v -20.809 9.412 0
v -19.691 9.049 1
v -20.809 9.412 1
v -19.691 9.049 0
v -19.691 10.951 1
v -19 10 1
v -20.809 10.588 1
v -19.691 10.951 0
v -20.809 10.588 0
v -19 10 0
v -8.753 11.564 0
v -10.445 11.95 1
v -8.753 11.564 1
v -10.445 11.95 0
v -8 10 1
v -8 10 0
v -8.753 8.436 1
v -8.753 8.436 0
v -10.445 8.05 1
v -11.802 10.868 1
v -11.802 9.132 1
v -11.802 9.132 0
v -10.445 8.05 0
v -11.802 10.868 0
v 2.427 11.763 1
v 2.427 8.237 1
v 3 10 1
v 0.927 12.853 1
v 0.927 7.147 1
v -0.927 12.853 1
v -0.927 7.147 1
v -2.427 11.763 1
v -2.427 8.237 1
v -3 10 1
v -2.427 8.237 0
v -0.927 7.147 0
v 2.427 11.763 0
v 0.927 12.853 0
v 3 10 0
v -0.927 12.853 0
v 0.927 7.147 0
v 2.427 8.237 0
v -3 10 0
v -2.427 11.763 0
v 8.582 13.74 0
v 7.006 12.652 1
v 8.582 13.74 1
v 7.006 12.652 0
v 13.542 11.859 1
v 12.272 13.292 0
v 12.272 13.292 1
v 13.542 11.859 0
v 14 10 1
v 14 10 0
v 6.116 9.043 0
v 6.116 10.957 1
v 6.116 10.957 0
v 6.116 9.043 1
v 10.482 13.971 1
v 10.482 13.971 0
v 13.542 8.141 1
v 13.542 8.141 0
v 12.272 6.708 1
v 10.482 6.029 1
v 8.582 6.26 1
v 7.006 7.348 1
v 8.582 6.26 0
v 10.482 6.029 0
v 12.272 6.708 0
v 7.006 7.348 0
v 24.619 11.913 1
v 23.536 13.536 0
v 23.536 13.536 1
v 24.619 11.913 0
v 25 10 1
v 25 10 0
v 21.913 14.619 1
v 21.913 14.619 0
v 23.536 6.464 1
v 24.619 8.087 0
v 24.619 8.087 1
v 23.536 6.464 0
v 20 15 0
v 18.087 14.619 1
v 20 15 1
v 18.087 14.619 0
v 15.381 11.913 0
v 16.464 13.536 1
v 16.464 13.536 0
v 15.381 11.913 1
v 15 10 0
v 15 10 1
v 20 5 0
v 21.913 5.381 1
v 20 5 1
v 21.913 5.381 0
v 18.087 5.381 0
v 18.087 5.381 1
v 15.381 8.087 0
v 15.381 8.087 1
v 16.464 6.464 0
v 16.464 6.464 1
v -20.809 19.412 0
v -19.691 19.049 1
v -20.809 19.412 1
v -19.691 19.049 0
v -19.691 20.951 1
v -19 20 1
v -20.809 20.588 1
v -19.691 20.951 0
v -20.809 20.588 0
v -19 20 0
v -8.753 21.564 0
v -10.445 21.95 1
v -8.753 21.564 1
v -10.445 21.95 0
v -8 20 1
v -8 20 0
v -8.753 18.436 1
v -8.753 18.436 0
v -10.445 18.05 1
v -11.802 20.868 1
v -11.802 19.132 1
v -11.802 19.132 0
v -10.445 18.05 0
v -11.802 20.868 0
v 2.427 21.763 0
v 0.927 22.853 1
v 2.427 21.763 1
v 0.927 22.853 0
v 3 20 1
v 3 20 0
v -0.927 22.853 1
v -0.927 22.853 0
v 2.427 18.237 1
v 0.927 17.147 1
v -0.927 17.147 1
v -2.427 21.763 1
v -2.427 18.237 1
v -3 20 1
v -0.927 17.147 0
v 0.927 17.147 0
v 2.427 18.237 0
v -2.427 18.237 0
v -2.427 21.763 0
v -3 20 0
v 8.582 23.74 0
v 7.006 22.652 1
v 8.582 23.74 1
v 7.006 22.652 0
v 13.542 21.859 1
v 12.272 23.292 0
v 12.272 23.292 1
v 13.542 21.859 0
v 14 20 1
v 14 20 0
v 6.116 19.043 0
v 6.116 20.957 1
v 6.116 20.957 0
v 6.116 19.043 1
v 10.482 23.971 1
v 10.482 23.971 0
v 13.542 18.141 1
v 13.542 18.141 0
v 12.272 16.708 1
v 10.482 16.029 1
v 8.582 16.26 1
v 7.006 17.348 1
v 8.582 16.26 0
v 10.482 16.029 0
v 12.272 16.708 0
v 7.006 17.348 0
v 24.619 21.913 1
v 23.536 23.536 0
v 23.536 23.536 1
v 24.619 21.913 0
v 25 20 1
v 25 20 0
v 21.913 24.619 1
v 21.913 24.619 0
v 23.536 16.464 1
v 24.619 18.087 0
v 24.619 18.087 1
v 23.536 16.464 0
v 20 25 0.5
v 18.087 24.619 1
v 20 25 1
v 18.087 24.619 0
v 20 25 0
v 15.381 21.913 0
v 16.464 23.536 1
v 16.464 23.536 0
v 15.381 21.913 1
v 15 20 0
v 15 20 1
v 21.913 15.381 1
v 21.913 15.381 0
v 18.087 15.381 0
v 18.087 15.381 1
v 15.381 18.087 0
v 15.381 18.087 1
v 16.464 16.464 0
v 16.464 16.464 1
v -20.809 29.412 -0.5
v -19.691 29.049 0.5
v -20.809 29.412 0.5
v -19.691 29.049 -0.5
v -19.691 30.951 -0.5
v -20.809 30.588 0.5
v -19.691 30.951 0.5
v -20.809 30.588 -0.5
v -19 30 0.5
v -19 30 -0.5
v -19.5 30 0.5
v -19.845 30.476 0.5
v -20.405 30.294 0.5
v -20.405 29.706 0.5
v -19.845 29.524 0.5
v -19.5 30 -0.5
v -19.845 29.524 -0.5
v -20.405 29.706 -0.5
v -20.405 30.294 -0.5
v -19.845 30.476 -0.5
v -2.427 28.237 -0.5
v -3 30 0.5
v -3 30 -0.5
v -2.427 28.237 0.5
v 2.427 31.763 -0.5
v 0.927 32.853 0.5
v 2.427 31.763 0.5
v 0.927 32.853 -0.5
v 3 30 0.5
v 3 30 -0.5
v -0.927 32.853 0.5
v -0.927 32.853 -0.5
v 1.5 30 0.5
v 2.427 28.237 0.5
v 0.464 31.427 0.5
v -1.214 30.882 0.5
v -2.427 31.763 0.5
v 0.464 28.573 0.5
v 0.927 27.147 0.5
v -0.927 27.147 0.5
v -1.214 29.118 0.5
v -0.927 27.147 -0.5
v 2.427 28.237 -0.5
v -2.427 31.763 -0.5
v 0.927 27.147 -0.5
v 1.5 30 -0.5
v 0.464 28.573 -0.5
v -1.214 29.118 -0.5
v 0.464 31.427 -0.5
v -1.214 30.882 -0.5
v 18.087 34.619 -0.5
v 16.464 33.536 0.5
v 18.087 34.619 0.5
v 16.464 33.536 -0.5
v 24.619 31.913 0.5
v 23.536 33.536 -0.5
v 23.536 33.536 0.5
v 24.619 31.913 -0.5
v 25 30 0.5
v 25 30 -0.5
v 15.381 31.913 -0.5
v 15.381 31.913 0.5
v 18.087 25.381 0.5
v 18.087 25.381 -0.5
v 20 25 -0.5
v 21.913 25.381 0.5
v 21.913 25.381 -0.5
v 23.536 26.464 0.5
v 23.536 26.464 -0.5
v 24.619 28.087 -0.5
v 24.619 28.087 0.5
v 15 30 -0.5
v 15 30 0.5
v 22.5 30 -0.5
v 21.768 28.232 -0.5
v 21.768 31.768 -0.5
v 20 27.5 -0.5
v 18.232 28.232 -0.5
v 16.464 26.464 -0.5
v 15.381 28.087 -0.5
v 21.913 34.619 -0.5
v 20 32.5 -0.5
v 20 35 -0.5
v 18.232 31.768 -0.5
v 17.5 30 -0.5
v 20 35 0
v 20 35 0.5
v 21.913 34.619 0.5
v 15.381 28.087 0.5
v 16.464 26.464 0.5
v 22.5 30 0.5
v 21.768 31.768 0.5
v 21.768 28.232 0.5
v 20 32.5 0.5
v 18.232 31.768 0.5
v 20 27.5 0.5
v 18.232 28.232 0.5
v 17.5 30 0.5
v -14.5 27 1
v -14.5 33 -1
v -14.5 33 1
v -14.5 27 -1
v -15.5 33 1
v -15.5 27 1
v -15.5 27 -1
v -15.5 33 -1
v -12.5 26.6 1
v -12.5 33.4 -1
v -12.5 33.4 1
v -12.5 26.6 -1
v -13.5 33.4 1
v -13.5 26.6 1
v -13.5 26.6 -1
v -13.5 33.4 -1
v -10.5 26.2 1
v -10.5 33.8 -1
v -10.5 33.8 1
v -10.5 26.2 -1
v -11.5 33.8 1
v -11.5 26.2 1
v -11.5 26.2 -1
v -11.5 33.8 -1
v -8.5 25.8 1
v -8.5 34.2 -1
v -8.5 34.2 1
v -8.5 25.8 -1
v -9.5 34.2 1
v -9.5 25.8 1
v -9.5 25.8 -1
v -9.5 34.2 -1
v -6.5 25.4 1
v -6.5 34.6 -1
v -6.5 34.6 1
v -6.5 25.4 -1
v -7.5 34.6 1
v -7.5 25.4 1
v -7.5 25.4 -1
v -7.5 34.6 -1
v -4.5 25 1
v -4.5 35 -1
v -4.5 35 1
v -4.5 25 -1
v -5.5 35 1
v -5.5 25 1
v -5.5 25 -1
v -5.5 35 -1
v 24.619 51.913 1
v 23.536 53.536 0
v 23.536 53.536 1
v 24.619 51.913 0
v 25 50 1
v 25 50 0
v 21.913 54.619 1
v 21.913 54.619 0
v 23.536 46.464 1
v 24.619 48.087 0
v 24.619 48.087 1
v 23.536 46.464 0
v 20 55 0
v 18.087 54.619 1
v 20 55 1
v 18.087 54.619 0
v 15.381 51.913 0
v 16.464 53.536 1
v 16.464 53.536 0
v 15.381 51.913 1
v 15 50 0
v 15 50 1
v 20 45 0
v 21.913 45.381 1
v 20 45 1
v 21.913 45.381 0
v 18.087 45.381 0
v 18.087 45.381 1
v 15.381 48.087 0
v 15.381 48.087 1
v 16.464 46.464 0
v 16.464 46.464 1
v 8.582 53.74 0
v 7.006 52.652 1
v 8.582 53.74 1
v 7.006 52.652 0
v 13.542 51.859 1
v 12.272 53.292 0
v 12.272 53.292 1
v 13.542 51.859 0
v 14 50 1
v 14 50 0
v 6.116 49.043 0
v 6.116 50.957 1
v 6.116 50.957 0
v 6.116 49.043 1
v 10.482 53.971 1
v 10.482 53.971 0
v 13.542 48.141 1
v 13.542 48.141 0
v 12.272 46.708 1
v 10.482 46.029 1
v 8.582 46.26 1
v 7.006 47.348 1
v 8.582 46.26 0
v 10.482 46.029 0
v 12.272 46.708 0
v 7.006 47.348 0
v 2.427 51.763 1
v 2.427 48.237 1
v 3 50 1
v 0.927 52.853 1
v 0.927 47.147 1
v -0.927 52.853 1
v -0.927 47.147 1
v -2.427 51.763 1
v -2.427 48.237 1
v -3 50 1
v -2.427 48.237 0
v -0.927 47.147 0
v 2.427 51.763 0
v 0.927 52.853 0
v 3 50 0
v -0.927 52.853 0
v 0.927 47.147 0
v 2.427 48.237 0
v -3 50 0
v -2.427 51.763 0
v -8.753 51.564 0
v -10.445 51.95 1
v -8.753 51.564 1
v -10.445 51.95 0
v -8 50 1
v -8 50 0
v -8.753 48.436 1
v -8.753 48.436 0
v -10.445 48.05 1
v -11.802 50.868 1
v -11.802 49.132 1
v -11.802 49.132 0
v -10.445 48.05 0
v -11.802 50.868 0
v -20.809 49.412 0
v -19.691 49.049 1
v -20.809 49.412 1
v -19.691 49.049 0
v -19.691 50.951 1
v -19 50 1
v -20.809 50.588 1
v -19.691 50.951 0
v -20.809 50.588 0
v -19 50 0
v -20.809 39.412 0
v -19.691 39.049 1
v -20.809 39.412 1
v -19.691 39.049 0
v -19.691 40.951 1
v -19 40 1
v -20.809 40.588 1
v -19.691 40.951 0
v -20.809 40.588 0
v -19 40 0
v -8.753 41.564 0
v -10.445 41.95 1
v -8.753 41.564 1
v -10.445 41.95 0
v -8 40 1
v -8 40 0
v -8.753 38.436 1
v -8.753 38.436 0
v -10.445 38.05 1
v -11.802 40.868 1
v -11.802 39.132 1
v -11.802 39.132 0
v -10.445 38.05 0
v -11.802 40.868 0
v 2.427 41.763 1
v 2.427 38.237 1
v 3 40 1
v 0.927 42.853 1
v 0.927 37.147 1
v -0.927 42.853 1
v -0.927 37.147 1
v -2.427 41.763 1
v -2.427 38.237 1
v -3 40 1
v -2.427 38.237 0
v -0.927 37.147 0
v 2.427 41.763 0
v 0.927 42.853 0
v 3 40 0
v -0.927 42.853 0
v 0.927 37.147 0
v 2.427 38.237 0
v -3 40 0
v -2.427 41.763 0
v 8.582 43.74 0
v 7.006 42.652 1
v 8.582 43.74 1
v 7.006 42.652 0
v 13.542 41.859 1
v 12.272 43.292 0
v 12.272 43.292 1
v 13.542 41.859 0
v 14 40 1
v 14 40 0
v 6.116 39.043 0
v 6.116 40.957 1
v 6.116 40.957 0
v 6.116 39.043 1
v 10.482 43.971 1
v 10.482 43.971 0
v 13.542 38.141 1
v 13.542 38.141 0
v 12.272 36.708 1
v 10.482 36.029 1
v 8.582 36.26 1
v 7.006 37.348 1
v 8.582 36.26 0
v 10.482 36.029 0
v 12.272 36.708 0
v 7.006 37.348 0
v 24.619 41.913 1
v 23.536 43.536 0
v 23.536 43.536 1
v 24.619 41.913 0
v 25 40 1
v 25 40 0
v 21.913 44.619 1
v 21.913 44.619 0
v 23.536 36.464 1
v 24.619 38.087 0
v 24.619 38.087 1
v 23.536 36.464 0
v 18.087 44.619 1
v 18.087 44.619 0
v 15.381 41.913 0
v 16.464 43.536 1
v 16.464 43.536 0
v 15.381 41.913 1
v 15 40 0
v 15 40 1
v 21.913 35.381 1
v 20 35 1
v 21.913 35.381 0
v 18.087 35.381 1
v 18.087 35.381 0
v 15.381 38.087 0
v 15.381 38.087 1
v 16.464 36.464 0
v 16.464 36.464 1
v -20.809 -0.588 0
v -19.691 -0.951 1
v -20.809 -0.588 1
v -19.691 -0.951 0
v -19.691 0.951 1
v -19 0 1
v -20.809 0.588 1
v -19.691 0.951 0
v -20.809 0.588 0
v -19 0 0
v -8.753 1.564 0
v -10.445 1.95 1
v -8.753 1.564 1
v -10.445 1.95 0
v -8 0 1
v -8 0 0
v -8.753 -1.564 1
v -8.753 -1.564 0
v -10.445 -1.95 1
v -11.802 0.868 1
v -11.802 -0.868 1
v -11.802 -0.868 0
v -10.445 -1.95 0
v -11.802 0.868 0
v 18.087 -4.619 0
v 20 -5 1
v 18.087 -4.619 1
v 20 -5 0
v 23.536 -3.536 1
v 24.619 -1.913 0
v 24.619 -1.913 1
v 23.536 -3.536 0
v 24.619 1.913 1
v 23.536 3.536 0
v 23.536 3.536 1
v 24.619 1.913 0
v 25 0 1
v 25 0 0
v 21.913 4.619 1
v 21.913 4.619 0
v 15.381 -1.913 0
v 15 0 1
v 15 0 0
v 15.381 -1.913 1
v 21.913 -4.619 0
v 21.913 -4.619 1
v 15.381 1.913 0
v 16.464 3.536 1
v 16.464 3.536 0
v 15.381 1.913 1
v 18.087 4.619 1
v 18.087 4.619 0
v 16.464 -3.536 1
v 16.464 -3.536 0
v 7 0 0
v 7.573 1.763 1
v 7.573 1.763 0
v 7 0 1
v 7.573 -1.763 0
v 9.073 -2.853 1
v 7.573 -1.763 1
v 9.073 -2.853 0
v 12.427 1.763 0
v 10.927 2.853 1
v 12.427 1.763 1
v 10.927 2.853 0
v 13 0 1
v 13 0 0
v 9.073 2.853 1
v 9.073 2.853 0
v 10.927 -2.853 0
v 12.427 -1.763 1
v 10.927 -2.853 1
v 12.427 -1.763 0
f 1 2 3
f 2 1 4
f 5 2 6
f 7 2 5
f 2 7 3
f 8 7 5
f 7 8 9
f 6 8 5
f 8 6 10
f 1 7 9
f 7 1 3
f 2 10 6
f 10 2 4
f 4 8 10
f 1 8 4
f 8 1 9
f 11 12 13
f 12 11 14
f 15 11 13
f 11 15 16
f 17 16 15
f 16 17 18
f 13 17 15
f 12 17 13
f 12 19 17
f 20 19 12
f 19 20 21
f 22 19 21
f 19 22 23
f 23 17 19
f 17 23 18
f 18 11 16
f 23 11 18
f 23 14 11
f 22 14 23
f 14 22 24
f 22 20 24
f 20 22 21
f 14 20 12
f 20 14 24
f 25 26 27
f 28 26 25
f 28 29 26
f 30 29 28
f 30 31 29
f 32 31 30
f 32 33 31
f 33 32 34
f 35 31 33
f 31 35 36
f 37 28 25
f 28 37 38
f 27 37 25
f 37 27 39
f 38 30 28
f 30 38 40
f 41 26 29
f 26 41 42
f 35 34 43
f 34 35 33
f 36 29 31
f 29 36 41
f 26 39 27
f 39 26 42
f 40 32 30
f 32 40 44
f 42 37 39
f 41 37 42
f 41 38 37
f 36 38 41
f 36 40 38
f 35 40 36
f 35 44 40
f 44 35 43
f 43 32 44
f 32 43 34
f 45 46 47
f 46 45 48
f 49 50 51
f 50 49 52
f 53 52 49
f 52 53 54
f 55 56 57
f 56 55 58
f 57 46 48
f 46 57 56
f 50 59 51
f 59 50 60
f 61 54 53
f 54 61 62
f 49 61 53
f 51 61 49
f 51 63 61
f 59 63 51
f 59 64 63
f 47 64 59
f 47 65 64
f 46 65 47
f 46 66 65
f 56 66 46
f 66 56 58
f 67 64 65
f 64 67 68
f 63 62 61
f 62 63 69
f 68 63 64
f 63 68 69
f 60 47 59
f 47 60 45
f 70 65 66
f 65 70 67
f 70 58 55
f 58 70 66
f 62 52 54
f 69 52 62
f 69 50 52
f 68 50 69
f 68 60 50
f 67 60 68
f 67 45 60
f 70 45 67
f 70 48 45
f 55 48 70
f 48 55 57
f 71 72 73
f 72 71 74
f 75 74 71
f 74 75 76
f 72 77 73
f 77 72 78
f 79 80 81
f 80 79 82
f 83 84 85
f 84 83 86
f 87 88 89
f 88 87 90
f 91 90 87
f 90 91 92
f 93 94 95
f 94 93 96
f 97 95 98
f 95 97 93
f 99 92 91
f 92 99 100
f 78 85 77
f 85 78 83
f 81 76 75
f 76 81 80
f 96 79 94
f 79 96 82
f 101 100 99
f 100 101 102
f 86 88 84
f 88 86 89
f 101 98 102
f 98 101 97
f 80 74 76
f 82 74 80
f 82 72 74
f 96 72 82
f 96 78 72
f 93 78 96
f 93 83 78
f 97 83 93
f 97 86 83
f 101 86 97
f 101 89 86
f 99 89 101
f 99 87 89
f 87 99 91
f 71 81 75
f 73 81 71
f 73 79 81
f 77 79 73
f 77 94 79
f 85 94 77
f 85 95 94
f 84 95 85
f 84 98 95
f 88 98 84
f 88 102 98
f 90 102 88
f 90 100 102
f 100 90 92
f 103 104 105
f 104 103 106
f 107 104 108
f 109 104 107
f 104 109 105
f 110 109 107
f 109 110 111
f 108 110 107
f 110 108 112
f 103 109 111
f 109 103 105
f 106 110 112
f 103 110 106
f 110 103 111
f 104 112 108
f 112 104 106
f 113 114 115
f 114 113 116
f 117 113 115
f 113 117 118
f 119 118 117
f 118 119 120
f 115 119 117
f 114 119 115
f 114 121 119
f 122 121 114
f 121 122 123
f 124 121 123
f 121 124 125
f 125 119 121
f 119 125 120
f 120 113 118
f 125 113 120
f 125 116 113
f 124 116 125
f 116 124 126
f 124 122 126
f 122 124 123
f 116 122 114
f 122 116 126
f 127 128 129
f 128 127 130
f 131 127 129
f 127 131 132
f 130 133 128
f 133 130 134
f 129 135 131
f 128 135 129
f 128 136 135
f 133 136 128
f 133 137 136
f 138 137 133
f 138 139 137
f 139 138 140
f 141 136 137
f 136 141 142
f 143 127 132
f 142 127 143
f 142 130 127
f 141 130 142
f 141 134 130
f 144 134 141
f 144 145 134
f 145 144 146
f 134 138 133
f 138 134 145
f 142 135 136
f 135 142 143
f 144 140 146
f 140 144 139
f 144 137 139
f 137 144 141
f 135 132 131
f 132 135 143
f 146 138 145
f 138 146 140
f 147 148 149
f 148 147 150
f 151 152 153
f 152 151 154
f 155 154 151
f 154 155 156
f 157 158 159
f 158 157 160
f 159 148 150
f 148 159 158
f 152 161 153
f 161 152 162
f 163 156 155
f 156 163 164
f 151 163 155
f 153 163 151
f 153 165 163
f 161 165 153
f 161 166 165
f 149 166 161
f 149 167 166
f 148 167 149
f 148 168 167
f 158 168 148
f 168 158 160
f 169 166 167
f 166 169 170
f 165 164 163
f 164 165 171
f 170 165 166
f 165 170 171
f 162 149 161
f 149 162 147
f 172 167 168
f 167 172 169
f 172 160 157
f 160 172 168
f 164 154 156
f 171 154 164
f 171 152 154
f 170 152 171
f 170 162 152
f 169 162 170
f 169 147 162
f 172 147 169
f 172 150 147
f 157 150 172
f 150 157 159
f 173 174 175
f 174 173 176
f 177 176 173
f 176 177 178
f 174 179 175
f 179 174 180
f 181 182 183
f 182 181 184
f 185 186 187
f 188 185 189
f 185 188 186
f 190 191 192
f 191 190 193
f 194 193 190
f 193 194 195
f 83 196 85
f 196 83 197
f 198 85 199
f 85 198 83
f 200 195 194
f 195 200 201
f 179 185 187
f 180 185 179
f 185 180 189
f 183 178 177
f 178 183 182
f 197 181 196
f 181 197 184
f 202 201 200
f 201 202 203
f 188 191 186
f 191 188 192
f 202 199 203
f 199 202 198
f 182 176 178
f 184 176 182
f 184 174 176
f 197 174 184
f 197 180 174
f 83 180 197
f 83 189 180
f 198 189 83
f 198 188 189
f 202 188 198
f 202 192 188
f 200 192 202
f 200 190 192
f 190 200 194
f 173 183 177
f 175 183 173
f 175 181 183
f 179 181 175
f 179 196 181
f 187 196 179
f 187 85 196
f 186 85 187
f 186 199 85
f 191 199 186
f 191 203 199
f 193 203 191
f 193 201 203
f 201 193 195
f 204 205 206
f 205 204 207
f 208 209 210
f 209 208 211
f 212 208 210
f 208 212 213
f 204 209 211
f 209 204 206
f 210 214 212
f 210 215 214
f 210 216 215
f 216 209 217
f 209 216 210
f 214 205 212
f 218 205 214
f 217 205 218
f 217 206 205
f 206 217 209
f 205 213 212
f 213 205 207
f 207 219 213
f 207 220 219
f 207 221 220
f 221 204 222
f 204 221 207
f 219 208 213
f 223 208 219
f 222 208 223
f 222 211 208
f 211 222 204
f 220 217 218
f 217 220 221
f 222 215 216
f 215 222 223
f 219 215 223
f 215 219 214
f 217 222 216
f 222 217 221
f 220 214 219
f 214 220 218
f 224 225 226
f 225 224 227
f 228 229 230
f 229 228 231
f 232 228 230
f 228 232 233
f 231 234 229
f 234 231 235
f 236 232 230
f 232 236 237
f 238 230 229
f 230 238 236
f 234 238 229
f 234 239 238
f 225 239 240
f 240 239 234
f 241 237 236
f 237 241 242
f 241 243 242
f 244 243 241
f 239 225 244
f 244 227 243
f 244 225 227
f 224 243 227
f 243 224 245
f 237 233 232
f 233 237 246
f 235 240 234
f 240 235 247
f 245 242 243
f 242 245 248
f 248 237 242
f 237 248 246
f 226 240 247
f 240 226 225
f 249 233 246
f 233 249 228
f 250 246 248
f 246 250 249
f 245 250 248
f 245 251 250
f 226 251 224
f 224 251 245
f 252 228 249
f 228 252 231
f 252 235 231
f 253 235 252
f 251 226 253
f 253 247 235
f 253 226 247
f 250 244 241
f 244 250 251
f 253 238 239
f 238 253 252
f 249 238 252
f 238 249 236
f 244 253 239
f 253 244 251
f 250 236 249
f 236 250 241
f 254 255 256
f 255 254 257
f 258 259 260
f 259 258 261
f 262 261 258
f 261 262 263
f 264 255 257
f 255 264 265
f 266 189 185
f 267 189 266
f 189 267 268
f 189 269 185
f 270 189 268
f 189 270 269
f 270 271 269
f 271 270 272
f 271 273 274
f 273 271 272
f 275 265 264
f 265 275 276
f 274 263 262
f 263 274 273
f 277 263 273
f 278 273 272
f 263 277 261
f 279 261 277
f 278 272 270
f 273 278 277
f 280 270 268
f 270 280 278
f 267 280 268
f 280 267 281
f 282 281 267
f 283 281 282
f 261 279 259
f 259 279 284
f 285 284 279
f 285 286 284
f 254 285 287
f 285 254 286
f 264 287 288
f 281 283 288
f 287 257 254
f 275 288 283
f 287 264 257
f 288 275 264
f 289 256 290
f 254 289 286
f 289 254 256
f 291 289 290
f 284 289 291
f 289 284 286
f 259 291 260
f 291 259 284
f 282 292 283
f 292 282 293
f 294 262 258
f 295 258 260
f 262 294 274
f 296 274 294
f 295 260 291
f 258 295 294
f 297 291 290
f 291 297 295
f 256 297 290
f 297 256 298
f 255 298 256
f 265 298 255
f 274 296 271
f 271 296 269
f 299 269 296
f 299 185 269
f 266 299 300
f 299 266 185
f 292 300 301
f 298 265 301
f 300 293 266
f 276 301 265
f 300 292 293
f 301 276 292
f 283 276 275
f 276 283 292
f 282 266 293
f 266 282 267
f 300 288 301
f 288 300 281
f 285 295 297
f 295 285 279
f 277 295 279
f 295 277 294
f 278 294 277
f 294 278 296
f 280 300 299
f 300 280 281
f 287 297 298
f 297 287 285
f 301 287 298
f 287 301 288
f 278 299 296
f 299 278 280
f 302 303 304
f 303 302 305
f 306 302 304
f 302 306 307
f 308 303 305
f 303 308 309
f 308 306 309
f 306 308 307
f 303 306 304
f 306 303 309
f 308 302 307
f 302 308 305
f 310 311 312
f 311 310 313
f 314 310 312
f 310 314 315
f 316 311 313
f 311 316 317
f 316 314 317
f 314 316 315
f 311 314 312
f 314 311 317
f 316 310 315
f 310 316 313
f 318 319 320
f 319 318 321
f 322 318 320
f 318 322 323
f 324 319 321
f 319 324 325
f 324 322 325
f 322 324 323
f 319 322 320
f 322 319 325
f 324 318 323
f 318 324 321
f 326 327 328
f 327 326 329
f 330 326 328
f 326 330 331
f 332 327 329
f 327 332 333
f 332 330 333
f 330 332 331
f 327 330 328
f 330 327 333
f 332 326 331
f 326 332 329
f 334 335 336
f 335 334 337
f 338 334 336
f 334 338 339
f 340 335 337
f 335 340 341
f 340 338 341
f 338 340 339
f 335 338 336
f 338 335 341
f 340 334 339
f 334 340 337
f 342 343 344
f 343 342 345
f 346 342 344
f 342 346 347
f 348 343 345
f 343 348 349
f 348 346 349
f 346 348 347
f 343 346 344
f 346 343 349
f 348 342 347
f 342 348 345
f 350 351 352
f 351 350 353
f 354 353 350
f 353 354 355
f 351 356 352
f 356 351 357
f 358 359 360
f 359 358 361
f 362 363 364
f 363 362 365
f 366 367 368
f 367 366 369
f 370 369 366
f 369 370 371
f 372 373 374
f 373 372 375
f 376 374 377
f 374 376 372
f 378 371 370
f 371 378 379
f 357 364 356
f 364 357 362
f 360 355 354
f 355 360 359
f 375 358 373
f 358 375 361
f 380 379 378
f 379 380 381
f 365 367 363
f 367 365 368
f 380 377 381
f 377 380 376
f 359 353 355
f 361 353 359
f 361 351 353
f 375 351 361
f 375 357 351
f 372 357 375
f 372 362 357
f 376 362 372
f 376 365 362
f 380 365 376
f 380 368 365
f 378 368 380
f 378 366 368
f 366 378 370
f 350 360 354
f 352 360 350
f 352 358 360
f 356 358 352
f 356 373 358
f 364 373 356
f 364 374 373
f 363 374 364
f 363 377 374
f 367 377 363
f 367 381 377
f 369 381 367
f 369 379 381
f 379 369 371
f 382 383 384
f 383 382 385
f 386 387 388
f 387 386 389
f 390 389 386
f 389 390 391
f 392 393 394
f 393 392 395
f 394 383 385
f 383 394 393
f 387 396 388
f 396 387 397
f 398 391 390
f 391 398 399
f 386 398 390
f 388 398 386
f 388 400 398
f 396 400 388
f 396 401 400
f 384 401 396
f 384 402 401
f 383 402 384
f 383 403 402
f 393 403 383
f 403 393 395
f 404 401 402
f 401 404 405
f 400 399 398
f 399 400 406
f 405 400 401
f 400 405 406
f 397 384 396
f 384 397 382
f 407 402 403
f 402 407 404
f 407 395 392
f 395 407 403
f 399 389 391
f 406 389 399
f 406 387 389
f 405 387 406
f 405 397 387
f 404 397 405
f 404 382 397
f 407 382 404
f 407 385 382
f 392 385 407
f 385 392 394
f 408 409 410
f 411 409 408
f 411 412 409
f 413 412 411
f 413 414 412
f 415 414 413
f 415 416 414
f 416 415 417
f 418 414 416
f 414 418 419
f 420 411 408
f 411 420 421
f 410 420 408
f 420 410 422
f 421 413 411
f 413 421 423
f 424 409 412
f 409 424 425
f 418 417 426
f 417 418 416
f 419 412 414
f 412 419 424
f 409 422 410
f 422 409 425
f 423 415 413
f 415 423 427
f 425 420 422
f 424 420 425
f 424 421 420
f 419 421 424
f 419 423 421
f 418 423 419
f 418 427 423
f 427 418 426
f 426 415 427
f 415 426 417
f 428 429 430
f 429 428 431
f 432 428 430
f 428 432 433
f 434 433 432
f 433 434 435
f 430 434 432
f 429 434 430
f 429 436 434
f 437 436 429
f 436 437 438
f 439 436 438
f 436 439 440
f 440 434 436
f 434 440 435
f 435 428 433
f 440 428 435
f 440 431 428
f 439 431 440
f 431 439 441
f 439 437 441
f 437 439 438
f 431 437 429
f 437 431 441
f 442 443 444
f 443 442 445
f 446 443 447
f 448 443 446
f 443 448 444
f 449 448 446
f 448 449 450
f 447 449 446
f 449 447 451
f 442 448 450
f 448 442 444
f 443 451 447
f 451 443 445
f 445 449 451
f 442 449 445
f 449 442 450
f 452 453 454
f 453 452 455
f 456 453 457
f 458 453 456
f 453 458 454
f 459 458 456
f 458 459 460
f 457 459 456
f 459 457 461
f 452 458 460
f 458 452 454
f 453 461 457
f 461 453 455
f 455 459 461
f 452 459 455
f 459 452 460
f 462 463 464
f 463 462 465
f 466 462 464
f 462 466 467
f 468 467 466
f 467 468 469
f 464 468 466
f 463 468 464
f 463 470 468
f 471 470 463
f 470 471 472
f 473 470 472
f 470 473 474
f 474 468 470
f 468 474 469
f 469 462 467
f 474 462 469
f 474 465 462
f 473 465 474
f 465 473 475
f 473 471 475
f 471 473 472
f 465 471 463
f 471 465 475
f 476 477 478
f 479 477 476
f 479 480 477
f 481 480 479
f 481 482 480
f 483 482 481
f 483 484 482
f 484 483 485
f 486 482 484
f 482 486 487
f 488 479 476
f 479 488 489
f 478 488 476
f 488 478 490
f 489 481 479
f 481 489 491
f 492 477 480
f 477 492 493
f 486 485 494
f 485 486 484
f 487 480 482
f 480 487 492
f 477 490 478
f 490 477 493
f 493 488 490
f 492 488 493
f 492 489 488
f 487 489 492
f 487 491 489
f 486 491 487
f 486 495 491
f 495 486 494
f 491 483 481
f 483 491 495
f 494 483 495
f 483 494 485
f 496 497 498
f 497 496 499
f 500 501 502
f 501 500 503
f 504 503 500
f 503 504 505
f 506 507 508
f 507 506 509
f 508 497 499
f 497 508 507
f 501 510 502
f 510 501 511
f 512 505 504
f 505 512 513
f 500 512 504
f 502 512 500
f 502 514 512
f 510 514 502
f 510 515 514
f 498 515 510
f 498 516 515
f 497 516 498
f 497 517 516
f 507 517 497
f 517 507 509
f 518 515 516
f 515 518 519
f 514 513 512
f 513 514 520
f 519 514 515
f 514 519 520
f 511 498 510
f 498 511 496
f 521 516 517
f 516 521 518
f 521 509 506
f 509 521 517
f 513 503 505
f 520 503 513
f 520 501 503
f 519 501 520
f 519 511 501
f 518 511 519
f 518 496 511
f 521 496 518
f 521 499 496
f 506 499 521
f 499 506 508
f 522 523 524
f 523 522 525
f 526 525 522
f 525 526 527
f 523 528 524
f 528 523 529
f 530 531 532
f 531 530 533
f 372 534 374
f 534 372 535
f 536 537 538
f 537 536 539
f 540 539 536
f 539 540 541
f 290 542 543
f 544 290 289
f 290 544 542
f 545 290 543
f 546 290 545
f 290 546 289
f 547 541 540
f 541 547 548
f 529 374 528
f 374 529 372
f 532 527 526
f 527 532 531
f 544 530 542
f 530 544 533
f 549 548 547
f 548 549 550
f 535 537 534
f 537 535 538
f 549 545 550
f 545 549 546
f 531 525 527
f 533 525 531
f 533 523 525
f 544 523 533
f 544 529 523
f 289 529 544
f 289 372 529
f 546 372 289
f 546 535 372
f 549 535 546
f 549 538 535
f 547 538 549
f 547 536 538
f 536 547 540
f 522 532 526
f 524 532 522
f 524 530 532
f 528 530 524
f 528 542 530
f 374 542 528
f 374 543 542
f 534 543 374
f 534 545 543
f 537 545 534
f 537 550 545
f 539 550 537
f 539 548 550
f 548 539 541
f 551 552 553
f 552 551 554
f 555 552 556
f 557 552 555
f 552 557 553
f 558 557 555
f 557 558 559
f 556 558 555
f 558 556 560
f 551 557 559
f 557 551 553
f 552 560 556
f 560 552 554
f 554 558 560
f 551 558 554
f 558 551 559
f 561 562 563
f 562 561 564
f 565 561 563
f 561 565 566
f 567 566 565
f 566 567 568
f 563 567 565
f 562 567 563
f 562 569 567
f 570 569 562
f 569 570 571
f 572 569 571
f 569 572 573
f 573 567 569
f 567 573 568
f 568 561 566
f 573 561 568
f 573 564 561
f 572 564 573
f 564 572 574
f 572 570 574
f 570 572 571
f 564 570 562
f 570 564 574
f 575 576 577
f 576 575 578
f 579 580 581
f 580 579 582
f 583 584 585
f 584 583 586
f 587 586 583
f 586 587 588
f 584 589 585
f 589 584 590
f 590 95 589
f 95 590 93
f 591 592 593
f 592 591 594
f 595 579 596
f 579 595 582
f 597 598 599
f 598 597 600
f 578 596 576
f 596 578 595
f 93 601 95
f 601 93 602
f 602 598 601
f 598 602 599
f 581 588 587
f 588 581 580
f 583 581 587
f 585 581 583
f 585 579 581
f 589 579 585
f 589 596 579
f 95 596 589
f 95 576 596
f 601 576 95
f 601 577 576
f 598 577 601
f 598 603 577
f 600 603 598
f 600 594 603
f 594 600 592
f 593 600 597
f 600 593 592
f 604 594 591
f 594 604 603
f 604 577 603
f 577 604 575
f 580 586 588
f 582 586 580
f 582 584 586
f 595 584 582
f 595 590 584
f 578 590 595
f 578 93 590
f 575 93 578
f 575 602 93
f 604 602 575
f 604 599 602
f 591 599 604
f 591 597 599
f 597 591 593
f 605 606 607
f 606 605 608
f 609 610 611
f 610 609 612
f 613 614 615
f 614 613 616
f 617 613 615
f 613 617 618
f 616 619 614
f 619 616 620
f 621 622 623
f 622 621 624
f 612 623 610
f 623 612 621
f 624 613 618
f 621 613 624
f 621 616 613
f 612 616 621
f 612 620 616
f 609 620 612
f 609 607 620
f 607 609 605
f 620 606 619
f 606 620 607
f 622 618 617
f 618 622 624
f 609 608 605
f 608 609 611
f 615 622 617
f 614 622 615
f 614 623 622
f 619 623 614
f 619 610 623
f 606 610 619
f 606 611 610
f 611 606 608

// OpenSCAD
// Empty
for();
// No children
for(i=2) { }
// Modifier and no children
%for(i=2) { }
#for(i=2) { }

// Null
translate([-10,0,0]) for() cylinder(r=4);

// Scalar
translate([10,0,0]) for(i=3) cylinder(r=i);

// Range
for(r=[1:5]) translate([r*10-30,10,0]) cylinder(r=r);

// Reverse
for(r=[5:1]) translate([r*10-30,20,0]) cylinder(r=r);

// Step
for(r=[1:2:6]) translate([r*10-30,30,0]) difference() {cylinder(r=r, center=true); cylinder(r=r/2, h=2, center=true);}

// Fractional step
for(r=[1.5:0.2:2.5]) translate([r*10-30,30,0]) cube([1, 4*r, 2], center=true);

// Negative range, negative step
for(r=[5:-1:1]) translate([r*10-30,50,0]) cylinder(r=r);

// Negative range, positive step (using backward compatible auto swap of begin and end)
for(r=[5:1]) translate([r*10-30,40,0]) cylinder(r=r);

// Zero step

for(r=[1:0:5]) translate([r*10+60,40,0]) cylinder(r=r);

// Negative step
for(r=[1:-1:5]) translate([r*10-30,50,0]) cylinder(r=r);

// Illegal step value
for(r=[1:true:5]) translate([r*10-60,50,0]) cylinder(r=r);

// Vector
for(r=[1,2,5]) translate([r*10-30,0,0]) cylinder(r=r);

// String
for(c="") echo("never shown");
for(c="a\u2191b\U01f600") echo(c);

nan = 0/0;
inf = 1/0;
ninf = -1/0;

echo(nan);
echo(inf);
echo(ninf);

// validate step values
for(i=[0:nan:0]) { echo("NAN", i); }
for(i=[0:inf:0]) { echo("INF", i); }
for(i=[0:ninf:0]) { echo("-INF", i); }

for(i=[0:nan:1]) { echo("NAN", i); }
for(i=[0:inf:1]) { echo("INF", i); }
for(i=[0:ninf:1]) { echo("-INF", i); }

for(i=[1:nan:0]) { echo("NAN", i); }
for(i=[1:inf:0]) { echo("INF", i); }
for(i=[1:ninf:0]) { echo("-INF", i); }

// validate begin / end values
for(i = [0:inf]) {}
for(i = [0:ninf]) {}
for(i = [inf:0]) {}
for(i = [ninf:0]) {}

for(i = [0:2:inf]) {}
for(i = [0:2:ninf]) {}    // 0 values, begin > end
for(i = [inf:2:0]) {}     // 0 values, begin > end
for(i = [ninf:2:0]) {}
for(i = [inf:2:inf]) {}   // 1 value,  begin == end
for(i = [ninf:2:ninf]) {} // 1 value,  begin == end
for(i = [inf:2:ninf]) {}  // 0 values, begin > end
for(i = [ninf:2:inf]) {}
